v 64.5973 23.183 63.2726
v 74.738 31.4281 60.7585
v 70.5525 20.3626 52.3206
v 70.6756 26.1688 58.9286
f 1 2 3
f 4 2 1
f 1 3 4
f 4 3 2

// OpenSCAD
// Auto-generated auxetic polyhedron
points = [
    [70.552460, 20.362570, 52.320591],
    [74.737953, 31.428100, 60.758514],
    [64.597330, 23.183032, 63.272628],
    [70.675551, 26.168834, 58.928641],
];

faces = [
    [0, 1, 2],
    [2, 1, 3],
    [3, 0, 2],
    [1, 0, 3],
];

polyhedron(points = points, faces = faces);
